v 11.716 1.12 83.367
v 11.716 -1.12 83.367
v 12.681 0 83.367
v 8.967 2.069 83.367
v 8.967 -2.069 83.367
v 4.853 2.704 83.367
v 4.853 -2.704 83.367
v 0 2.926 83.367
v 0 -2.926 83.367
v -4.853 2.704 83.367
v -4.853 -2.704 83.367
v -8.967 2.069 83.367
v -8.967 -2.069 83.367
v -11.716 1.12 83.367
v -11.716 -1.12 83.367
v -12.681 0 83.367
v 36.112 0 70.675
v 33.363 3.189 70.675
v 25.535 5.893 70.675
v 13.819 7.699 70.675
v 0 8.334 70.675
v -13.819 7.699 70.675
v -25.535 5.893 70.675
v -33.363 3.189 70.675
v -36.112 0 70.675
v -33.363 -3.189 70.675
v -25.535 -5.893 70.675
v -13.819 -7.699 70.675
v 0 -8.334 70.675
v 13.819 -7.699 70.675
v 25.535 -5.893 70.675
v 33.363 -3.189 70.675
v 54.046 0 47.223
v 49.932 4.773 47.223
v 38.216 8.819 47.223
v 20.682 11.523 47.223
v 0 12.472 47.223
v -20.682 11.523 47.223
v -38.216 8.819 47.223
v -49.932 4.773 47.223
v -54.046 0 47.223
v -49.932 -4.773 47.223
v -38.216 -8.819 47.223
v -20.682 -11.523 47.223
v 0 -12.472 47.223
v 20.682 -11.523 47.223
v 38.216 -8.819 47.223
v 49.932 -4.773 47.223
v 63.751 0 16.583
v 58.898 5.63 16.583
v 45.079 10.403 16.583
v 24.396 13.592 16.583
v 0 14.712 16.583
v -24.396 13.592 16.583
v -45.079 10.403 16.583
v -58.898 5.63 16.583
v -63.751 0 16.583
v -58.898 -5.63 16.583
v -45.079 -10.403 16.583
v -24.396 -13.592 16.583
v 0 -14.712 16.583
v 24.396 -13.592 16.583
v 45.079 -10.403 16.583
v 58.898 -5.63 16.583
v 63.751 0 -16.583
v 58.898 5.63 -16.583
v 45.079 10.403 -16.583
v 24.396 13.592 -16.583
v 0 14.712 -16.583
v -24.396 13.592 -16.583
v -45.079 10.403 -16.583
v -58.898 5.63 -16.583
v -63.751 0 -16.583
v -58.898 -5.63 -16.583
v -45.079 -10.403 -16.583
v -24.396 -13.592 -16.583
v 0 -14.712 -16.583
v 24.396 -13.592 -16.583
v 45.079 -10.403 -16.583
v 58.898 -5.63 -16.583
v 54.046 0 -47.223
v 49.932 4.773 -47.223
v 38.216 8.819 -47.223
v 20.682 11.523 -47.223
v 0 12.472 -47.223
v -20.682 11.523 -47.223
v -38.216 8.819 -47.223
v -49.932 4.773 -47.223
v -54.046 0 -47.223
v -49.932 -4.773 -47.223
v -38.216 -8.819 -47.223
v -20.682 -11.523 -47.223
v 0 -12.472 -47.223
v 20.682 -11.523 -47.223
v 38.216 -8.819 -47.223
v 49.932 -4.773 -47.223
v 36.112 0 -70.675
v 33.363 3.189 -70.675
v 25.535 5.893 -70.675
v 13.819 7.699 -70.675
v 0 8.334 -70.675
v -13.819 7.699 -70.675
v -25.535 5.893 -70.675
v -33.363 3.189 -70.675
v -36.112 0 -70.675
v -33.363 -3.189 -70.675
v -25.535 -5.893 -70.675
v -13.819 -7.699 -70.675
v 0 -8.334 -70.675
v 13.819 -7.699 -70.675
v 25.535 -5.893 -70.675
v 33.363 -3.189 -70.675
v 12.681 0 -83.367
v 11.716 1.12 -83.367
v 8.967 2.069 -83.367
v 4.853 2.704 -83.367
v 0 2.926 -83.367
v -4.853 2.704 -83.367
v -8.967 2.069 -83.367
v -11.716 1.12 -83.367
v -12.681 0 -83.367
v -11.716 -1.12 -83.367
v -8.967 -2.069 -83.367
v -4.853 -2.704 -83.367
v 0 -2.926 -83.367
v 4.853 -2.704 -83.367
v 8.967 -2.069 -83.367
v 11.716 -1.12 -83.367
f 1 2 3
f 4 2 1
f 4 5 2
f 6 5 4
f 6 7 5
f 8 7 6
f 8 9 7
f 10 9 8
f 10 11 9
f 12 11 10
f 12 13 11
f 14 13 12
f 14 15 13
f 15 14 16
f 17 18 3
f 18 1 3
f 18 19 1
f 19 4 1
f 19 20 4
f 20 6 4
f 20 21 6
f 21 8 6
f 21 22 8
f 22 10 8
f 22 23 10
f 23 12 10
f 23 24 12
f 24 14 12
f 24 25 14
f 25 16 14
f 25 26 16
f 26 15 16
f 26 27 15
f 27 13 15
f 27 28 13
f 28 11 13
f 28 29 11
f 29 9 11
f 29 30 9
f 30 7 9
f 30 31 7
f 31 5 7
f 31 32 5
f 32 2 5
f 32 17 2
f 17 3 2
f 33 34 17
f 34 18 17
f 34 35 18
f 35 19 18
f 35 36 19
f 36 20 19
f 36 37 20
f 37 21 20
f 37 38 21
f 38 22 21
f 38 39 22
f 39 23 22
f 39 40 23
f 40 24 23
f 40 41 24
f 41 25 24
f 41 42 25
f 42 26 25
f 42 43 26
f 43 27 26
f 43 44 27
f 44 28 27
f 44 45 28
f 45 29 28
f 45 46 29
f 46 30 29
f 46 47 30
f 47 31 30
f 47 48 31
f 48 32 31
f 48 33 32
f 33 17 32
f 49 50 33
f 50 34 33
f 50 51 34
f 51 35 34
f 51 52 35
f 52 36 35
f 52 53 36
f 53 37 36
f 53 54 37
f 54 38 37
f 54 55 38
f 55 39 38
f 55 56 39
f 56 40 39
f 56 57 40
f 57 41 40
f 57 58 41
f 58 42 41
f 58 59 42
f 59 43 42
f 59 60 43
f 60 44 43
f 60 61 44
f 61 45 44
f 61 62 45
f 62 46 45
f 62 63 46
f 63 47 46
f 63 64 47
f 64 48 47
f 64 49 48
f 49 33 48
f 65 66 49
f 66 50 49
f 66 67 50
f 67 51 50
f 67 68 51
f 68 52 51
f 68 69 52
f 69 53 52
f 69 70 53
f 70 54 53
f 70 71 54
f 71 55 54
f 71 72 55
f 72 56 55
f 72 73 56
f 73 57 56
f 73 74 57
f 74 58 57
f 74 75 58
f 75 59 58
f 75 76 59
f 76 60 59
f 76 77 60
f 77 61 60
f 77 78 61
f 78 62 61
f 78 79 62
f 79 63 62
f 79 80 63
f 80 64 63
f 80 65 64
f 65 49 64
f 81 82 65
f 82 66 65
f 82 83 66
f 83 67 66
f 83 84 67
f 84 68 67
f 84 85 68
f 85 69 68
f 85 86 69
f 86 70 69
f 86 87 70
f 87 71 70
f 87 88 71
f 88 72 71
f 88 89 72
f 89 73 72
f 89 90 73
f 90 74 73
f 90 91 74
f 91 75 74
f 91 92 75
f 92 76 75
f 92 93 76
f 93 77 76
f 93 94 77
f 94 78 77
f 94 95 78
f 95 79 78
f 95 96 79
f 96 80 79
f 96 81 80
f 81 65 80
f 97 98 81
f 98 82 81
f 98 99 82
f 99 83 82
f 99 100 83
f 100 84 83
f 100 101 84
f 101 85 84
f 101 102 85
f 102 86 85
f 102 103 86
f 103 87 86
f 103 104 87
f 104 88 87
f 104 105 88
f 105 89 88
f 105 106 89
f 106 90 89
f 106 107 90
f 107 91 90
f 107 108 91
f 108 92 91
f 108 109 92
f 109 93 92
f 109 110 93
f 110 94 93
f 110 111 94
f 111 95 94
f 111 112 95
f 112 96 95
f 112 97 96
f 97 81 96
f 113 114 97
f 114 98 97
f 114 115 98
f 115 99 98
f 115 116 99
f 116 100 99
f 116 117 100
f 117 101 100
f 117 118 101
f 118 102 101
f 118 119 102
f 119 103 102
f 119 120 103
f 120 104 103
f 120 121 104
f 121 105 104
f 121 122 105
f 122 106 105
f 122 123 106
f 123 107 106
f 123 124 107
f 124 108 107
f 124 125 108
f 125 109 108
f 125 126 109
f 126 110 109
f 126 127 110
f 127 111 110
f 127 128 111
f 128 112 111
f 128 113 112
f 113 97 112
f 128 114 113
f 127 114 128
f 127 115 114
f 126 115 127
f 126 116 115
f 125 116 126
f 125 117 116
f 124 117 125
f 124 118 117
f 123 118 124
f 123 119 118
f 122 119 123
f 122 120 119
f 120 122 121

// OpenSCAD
// Generated by SolidPython 1.0.1 on 2020-07-29 00:46:50


scale(v = [13, 3, 17]) {
	sphere(r = 5);
}
/***********************************************
*********      SolidPython code:      **********
************************************************
 
# import packages: SolidPython
from solid import *
from solid.utils import *
from itertools import chain, combinations, permutations


class Resize:

    def __init__(self, scad_file):
        self.scad_file = scad_file
        #self.scad_file = import_scad(scad_file)
        # cone/cylinder param:
        self.r1 = 0
        self.r2 = 0
        self.h = 0
        # rectangular prism param:
        self.w = 0
        self.l = 0
        # ellipse param:
        self.r = 0

    # import OpenScad code (file name corresponds to shape)


    # classify shape + parameters
    def assign(self, param1, param2, param3):
        if self.scad_file == 'cone.scad':
            self.r1 = param1
            self.r2 = param2
            self.h = param3
        elif self.scad_file == 'cylinder.scad':
            self.r1 = param1
            self.r2 = param2
            self.h = param3
        elif self.scad_file == 'rectangularPrism.scad':
            self.h = param1
            self.l = param2
            self.w = param3
        else:
            self.r = param1
            self.h = param2

    # resize parameters
    def iterate(self):
        x = range(3, 20, 2)
        i = 1
        if self.scad_file == 'cone.scad':
            tempList = list(permutations(x, 2))
            for temp in tempList:
                param1 = temp[0]
                param2 = temp[1]
                filepath = 'produced_scad_files/' + 'cone' + str(param1) + '_' + str(param2) + '_' + '.scad'
                scad_render_to_file(cylinder(h=param1, r1=param2, r2=0), filepath)

        elif self.scad_file == 'cylinder.scad':
            tempList = list(permutations(x, 3))
            for temp in tempList:
                param1 = temp[0]
                param2 = temp[1]
                filepath = 'produced_scad_files/' + 'cylinder' + str(param1) + '_' + str(param2) + '_' + '.scad'
                scad_render_to_file(cylinder(h=param1, r1=param2, r2=param2), filepath)

        elif self.scad_file == 'rectangularPrism.scad':
            tempList = list(permutations(x, 3))
            for temp in tempList:
                param1 = temp[0]
                param2 = temp[1]
                param3 = temp[2]
                filepath = 'produced_scad_files/' + 'rectangularPrism' + str(param1) + '_' + str(param2) + '_' + str(
                    param3) + '.scad'
                scad_render_to_file(cube(size=(param1, param2, param3)), filepath)

        elif self.scad_file == 'ellipse.scad':
            tempList = list(permutations(x, 4))
            for temp in tempList:
                param1 = temp[0]
                param2 = temp[1]
                param3 = temp[2]
                param4 = temp[3]
                filepath = 'produced_scad_files/' + 'ellipse' + str(param1) + '_' + str(param2) + '_' + str(param3) + '_' + str(param4) + '.scad'
                scad_render_to_file(scale([param1, param2, param3])(sphere(r=param4)), filepath)

    def render_to_scadfile(self):
        scad_render_to_file(scad, 'example.scad') 
 
************************************************/
